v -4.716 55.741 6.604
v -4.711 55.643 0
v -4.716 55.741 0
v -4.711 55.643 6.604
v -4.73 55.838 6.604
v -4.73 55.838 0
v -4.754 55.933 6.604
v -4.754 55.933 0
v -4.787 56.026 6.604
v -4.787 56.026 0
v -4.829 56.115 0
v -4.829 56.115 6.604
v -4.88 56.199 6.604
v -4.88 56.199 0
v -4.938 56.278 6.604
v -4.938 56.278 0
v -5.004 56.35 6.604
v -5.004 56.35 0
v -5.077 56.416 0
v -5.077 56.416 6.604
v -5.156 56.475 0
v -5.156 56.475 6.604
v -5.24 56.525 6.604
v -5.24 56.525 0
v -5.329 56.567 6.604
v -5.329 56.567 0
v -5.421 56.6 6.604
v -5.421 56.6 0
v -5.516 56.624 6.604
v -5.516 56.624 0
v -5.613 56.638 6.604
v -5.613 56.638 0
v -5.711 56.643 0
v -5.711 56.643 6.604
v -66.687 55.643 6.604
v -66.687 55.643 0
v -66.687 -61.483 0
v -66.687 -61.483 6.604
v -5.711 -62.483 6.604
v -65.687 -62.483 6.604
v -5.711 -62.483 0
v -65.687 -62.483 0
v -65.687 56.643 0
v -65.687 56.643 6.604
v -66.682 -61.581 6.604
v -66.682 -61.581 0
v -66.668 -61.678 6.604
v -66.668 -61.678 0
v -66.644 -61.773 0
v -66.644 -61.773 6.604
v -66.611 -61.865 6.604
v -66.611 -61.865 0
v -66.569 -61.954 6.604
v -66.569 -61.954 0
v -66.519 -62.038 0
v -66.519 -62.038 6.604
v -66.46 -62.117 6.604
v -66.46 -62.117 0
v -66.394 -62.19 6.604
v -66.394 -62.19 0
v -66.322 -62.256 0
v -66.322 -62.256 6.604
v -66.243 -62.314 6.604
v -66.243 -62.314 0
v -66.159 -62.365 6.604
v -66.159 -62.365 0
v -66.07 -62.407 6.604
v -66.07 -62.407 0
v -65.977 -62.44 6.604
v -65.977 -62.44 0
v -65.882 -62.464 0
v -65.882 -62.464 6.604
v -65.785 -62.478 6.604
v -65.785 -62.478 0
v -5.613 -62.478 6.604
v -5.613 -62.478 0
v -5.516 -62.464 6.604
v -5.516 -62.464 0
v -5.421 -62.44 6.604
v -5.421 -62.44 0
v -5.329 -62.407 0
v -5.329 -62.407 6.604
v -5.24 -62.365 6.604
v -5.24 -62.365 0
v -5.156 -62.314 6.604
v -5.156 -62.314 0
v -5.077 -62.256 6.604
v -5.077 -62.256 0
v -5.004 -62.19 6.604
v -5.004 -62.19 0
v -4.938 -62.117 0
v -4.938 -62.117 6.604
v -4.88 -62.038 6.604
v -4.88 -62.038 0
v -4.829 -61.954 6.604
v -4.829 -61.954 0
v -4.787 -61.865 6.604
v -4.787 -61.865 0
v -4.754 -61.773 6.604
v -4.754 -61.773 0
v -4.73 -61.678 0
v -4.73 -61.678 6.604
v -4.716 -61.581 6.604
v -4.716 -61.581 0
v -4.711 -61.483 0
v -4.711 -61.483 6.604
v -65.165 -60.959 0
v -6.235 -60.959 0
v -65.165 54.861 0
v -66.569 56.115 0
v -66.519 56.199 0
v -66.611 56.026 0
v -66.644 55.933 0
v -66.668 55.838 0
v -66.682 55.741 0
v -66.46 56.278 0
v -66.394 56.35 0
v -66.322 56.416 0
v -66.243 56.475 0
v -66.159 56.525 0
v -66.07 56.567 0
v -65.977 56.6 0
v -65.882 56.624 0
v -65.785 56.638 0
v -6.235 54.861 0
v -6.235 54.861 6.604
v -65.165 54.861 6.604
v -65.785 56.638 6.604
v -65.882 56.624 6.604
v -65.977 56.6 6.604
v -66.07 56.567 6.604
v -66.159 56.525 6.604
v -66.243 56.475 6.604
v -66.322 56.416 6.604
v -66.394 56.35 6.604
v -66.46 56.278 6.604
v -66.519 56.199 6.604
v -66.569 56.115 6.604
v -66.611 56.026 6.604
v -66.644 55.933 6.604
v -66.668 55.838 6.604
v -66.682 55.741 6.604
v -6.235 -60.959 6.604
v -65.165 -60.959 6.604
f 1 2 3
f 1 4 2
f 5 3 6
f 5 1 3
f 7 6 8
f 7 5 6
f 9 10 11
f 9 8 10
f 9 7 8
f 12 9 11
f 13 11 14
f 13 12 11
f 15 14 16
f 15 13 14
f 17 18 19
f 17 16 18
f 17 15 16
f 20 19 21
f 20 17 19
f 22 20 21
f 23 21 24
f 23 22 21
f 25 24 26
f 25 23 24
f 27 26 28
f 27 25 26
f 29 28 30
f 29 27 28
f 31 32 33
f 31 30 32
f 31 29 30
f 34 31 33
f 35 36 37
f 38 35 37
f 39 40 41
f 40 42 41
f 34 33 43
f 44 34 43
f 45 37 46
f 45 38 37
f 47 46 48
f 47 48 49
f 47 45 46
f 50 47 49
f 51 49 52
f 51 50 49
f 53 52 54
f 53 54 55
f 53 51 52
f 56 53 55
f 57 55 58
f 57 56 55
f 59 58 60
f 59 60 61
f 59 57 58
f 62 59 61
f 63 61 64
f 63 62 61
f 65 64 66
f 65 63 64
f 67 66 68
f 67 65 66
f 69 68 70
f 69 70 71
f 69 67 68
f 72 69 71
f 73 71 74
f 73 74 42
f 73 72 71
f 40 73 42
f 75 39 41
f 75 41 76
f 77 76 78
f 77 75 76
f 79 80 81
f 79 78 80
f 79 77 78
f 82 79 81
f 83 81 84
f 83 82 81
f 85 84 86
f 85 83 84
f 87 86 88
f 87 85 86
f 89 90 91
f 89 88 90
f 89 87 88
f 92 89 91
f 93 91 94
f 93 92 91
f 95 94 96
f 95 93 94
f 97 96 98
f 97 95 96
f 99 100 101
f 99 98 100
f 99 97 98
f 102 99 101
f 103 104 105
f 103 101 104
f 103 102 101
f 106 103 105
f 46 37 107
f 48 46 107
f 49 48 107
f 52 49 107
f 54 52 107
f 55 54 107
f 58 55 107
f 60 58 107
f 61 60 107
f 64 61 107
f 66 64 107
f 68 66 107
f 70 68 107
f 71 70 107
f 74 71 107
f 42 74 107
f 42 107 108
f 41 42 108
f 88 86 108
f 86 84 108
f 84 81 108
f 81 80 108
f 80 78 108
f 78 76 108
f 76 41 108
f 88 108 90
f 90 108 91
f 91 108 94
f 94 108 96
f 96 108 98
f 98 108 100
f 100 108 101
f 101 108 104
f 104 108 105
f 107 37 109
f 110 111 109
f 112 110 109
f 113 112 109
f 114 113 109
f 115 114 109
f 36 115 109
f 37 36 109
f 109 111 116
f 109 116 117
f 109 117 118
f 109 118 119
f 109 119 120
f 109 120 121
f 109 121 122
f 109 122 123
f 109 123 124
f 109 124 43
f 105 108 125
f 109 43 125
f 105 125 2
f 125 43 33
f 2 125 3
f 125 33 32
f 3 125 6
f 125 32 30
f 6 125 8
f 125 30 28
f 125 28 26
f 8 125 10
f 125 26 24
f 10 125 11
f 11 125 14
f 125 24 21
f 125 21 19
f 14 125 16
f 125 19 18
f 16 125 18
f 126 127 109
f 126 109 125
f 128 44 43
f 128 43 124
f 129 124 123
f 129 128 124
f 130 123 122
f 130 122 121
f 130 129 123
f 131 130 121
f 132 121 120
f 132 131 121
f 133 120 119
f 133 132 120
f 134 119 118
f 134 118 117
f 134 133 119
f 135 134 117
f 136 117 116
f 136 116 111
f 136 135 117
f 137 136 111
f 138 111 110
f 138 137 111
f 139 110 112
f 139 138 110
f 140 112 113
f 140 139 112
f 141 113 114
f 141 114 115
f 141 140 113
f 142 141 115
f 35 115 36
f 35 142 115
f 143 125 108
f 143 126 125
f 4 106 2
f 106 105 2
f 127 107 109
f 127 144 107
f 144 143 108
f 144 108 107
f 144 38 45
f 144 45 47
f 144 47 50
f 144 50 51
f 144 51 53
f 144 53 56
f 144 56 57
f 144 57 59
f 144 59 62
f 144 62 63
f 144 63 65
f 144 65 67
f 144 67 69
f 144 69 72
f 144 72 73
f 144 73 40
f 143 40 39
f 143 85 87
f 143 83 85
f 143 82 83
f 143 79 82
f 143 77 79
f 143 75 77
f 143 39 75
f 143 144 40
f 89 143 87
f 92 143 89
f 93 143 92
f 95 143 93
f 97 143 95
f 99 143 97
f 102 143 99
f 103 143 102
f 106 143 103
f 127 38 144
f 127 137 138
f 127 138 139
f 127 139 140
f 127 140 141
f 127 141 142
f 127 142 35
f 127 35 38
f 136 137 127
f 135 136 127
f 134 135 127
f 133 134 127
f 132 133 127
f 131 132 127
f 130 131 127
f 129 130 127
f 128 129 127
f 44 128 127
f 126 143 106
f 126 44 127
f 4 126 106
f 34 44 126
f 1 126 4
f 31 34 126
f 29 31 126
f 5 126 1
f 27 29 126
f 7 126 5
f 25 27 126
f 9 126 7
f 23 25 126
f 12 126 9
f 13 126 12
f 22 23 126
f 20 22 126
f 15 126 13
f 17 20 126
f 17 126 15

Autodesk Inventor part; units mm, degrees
ref_plane "YZ Plane" through (0, 0, 0) normal (1, 0, 0) x (0, 1, 0)
ref_plane "XZ Plane" through (0, 0, 0) normal (0, 1, 0) x (-1, 0, 0)
ref_plane "XY Plane" through (0, 0, 0) normal (0, 0, 1) x (1, 0, 0)
sketch "Sketch1" plane through (0, 0, 0) normal (0, 0, 1) x (1, 0, 0)
  line L0 (-66.6872, 56.6432) -> (-66.6872, -62.4828)
  line L1 (-66.6872, -62.4828) -> (-4.7112, -62.4828)
  line L2 (-4.7112, -62.4828) -> (-4.7112, 56.6432)
  line L3 (-4.7112, 56.6432) -> (-66.6872, 56.6432)
  point P0 (0, 0)
  dimension "d0" = 119.126
  dimension "d1" = 61.976
extrude "Extrusion1" add sketch "Sketch1" along normal blind 6.604
sketch "Sketch2" plane through (0, 0, 6.604) normal (0, 0, 1) x (1, 0, 0)
  line L0 (-65.1652, 54.8612) -> (-6.2352, 54.8612)
  line L1 (-6.2352, 54.8612) -> (-6.2352, -60.9588)
  line L2 (-6.2352, -60.9588) -> (-65.1652, -60.9588)
  line L3 (-65.1652, -60.9588) -> (-65.1652, 54.8612)
  line L4 (-4.7112, -62.4828) -> (-4.7112, 56.6432) projected
  line L5 (-66.6872, -62.4828) -> (-4.7112, -62.4828) projected
  point P0 (0, 0)
  dimension "d4" = 115.82
  dimension "d5" = 58.93
  dimension "d6" = 1.524
  dimension "d7" = 1.524
extrude "Extrusion2" cut sketch "Sketch2" against normal blind 6.604
fillet "Fillet1" radius 1 4 edges at (-66.6872, -62.4828, 3.302) (-66.6872, 56.6432, 3.302) (-4.7112, 56.6432, 3.302) (-4.7112, -62.4828, 3.302)
properties part number "Smart Lock Box Middle Correct"
